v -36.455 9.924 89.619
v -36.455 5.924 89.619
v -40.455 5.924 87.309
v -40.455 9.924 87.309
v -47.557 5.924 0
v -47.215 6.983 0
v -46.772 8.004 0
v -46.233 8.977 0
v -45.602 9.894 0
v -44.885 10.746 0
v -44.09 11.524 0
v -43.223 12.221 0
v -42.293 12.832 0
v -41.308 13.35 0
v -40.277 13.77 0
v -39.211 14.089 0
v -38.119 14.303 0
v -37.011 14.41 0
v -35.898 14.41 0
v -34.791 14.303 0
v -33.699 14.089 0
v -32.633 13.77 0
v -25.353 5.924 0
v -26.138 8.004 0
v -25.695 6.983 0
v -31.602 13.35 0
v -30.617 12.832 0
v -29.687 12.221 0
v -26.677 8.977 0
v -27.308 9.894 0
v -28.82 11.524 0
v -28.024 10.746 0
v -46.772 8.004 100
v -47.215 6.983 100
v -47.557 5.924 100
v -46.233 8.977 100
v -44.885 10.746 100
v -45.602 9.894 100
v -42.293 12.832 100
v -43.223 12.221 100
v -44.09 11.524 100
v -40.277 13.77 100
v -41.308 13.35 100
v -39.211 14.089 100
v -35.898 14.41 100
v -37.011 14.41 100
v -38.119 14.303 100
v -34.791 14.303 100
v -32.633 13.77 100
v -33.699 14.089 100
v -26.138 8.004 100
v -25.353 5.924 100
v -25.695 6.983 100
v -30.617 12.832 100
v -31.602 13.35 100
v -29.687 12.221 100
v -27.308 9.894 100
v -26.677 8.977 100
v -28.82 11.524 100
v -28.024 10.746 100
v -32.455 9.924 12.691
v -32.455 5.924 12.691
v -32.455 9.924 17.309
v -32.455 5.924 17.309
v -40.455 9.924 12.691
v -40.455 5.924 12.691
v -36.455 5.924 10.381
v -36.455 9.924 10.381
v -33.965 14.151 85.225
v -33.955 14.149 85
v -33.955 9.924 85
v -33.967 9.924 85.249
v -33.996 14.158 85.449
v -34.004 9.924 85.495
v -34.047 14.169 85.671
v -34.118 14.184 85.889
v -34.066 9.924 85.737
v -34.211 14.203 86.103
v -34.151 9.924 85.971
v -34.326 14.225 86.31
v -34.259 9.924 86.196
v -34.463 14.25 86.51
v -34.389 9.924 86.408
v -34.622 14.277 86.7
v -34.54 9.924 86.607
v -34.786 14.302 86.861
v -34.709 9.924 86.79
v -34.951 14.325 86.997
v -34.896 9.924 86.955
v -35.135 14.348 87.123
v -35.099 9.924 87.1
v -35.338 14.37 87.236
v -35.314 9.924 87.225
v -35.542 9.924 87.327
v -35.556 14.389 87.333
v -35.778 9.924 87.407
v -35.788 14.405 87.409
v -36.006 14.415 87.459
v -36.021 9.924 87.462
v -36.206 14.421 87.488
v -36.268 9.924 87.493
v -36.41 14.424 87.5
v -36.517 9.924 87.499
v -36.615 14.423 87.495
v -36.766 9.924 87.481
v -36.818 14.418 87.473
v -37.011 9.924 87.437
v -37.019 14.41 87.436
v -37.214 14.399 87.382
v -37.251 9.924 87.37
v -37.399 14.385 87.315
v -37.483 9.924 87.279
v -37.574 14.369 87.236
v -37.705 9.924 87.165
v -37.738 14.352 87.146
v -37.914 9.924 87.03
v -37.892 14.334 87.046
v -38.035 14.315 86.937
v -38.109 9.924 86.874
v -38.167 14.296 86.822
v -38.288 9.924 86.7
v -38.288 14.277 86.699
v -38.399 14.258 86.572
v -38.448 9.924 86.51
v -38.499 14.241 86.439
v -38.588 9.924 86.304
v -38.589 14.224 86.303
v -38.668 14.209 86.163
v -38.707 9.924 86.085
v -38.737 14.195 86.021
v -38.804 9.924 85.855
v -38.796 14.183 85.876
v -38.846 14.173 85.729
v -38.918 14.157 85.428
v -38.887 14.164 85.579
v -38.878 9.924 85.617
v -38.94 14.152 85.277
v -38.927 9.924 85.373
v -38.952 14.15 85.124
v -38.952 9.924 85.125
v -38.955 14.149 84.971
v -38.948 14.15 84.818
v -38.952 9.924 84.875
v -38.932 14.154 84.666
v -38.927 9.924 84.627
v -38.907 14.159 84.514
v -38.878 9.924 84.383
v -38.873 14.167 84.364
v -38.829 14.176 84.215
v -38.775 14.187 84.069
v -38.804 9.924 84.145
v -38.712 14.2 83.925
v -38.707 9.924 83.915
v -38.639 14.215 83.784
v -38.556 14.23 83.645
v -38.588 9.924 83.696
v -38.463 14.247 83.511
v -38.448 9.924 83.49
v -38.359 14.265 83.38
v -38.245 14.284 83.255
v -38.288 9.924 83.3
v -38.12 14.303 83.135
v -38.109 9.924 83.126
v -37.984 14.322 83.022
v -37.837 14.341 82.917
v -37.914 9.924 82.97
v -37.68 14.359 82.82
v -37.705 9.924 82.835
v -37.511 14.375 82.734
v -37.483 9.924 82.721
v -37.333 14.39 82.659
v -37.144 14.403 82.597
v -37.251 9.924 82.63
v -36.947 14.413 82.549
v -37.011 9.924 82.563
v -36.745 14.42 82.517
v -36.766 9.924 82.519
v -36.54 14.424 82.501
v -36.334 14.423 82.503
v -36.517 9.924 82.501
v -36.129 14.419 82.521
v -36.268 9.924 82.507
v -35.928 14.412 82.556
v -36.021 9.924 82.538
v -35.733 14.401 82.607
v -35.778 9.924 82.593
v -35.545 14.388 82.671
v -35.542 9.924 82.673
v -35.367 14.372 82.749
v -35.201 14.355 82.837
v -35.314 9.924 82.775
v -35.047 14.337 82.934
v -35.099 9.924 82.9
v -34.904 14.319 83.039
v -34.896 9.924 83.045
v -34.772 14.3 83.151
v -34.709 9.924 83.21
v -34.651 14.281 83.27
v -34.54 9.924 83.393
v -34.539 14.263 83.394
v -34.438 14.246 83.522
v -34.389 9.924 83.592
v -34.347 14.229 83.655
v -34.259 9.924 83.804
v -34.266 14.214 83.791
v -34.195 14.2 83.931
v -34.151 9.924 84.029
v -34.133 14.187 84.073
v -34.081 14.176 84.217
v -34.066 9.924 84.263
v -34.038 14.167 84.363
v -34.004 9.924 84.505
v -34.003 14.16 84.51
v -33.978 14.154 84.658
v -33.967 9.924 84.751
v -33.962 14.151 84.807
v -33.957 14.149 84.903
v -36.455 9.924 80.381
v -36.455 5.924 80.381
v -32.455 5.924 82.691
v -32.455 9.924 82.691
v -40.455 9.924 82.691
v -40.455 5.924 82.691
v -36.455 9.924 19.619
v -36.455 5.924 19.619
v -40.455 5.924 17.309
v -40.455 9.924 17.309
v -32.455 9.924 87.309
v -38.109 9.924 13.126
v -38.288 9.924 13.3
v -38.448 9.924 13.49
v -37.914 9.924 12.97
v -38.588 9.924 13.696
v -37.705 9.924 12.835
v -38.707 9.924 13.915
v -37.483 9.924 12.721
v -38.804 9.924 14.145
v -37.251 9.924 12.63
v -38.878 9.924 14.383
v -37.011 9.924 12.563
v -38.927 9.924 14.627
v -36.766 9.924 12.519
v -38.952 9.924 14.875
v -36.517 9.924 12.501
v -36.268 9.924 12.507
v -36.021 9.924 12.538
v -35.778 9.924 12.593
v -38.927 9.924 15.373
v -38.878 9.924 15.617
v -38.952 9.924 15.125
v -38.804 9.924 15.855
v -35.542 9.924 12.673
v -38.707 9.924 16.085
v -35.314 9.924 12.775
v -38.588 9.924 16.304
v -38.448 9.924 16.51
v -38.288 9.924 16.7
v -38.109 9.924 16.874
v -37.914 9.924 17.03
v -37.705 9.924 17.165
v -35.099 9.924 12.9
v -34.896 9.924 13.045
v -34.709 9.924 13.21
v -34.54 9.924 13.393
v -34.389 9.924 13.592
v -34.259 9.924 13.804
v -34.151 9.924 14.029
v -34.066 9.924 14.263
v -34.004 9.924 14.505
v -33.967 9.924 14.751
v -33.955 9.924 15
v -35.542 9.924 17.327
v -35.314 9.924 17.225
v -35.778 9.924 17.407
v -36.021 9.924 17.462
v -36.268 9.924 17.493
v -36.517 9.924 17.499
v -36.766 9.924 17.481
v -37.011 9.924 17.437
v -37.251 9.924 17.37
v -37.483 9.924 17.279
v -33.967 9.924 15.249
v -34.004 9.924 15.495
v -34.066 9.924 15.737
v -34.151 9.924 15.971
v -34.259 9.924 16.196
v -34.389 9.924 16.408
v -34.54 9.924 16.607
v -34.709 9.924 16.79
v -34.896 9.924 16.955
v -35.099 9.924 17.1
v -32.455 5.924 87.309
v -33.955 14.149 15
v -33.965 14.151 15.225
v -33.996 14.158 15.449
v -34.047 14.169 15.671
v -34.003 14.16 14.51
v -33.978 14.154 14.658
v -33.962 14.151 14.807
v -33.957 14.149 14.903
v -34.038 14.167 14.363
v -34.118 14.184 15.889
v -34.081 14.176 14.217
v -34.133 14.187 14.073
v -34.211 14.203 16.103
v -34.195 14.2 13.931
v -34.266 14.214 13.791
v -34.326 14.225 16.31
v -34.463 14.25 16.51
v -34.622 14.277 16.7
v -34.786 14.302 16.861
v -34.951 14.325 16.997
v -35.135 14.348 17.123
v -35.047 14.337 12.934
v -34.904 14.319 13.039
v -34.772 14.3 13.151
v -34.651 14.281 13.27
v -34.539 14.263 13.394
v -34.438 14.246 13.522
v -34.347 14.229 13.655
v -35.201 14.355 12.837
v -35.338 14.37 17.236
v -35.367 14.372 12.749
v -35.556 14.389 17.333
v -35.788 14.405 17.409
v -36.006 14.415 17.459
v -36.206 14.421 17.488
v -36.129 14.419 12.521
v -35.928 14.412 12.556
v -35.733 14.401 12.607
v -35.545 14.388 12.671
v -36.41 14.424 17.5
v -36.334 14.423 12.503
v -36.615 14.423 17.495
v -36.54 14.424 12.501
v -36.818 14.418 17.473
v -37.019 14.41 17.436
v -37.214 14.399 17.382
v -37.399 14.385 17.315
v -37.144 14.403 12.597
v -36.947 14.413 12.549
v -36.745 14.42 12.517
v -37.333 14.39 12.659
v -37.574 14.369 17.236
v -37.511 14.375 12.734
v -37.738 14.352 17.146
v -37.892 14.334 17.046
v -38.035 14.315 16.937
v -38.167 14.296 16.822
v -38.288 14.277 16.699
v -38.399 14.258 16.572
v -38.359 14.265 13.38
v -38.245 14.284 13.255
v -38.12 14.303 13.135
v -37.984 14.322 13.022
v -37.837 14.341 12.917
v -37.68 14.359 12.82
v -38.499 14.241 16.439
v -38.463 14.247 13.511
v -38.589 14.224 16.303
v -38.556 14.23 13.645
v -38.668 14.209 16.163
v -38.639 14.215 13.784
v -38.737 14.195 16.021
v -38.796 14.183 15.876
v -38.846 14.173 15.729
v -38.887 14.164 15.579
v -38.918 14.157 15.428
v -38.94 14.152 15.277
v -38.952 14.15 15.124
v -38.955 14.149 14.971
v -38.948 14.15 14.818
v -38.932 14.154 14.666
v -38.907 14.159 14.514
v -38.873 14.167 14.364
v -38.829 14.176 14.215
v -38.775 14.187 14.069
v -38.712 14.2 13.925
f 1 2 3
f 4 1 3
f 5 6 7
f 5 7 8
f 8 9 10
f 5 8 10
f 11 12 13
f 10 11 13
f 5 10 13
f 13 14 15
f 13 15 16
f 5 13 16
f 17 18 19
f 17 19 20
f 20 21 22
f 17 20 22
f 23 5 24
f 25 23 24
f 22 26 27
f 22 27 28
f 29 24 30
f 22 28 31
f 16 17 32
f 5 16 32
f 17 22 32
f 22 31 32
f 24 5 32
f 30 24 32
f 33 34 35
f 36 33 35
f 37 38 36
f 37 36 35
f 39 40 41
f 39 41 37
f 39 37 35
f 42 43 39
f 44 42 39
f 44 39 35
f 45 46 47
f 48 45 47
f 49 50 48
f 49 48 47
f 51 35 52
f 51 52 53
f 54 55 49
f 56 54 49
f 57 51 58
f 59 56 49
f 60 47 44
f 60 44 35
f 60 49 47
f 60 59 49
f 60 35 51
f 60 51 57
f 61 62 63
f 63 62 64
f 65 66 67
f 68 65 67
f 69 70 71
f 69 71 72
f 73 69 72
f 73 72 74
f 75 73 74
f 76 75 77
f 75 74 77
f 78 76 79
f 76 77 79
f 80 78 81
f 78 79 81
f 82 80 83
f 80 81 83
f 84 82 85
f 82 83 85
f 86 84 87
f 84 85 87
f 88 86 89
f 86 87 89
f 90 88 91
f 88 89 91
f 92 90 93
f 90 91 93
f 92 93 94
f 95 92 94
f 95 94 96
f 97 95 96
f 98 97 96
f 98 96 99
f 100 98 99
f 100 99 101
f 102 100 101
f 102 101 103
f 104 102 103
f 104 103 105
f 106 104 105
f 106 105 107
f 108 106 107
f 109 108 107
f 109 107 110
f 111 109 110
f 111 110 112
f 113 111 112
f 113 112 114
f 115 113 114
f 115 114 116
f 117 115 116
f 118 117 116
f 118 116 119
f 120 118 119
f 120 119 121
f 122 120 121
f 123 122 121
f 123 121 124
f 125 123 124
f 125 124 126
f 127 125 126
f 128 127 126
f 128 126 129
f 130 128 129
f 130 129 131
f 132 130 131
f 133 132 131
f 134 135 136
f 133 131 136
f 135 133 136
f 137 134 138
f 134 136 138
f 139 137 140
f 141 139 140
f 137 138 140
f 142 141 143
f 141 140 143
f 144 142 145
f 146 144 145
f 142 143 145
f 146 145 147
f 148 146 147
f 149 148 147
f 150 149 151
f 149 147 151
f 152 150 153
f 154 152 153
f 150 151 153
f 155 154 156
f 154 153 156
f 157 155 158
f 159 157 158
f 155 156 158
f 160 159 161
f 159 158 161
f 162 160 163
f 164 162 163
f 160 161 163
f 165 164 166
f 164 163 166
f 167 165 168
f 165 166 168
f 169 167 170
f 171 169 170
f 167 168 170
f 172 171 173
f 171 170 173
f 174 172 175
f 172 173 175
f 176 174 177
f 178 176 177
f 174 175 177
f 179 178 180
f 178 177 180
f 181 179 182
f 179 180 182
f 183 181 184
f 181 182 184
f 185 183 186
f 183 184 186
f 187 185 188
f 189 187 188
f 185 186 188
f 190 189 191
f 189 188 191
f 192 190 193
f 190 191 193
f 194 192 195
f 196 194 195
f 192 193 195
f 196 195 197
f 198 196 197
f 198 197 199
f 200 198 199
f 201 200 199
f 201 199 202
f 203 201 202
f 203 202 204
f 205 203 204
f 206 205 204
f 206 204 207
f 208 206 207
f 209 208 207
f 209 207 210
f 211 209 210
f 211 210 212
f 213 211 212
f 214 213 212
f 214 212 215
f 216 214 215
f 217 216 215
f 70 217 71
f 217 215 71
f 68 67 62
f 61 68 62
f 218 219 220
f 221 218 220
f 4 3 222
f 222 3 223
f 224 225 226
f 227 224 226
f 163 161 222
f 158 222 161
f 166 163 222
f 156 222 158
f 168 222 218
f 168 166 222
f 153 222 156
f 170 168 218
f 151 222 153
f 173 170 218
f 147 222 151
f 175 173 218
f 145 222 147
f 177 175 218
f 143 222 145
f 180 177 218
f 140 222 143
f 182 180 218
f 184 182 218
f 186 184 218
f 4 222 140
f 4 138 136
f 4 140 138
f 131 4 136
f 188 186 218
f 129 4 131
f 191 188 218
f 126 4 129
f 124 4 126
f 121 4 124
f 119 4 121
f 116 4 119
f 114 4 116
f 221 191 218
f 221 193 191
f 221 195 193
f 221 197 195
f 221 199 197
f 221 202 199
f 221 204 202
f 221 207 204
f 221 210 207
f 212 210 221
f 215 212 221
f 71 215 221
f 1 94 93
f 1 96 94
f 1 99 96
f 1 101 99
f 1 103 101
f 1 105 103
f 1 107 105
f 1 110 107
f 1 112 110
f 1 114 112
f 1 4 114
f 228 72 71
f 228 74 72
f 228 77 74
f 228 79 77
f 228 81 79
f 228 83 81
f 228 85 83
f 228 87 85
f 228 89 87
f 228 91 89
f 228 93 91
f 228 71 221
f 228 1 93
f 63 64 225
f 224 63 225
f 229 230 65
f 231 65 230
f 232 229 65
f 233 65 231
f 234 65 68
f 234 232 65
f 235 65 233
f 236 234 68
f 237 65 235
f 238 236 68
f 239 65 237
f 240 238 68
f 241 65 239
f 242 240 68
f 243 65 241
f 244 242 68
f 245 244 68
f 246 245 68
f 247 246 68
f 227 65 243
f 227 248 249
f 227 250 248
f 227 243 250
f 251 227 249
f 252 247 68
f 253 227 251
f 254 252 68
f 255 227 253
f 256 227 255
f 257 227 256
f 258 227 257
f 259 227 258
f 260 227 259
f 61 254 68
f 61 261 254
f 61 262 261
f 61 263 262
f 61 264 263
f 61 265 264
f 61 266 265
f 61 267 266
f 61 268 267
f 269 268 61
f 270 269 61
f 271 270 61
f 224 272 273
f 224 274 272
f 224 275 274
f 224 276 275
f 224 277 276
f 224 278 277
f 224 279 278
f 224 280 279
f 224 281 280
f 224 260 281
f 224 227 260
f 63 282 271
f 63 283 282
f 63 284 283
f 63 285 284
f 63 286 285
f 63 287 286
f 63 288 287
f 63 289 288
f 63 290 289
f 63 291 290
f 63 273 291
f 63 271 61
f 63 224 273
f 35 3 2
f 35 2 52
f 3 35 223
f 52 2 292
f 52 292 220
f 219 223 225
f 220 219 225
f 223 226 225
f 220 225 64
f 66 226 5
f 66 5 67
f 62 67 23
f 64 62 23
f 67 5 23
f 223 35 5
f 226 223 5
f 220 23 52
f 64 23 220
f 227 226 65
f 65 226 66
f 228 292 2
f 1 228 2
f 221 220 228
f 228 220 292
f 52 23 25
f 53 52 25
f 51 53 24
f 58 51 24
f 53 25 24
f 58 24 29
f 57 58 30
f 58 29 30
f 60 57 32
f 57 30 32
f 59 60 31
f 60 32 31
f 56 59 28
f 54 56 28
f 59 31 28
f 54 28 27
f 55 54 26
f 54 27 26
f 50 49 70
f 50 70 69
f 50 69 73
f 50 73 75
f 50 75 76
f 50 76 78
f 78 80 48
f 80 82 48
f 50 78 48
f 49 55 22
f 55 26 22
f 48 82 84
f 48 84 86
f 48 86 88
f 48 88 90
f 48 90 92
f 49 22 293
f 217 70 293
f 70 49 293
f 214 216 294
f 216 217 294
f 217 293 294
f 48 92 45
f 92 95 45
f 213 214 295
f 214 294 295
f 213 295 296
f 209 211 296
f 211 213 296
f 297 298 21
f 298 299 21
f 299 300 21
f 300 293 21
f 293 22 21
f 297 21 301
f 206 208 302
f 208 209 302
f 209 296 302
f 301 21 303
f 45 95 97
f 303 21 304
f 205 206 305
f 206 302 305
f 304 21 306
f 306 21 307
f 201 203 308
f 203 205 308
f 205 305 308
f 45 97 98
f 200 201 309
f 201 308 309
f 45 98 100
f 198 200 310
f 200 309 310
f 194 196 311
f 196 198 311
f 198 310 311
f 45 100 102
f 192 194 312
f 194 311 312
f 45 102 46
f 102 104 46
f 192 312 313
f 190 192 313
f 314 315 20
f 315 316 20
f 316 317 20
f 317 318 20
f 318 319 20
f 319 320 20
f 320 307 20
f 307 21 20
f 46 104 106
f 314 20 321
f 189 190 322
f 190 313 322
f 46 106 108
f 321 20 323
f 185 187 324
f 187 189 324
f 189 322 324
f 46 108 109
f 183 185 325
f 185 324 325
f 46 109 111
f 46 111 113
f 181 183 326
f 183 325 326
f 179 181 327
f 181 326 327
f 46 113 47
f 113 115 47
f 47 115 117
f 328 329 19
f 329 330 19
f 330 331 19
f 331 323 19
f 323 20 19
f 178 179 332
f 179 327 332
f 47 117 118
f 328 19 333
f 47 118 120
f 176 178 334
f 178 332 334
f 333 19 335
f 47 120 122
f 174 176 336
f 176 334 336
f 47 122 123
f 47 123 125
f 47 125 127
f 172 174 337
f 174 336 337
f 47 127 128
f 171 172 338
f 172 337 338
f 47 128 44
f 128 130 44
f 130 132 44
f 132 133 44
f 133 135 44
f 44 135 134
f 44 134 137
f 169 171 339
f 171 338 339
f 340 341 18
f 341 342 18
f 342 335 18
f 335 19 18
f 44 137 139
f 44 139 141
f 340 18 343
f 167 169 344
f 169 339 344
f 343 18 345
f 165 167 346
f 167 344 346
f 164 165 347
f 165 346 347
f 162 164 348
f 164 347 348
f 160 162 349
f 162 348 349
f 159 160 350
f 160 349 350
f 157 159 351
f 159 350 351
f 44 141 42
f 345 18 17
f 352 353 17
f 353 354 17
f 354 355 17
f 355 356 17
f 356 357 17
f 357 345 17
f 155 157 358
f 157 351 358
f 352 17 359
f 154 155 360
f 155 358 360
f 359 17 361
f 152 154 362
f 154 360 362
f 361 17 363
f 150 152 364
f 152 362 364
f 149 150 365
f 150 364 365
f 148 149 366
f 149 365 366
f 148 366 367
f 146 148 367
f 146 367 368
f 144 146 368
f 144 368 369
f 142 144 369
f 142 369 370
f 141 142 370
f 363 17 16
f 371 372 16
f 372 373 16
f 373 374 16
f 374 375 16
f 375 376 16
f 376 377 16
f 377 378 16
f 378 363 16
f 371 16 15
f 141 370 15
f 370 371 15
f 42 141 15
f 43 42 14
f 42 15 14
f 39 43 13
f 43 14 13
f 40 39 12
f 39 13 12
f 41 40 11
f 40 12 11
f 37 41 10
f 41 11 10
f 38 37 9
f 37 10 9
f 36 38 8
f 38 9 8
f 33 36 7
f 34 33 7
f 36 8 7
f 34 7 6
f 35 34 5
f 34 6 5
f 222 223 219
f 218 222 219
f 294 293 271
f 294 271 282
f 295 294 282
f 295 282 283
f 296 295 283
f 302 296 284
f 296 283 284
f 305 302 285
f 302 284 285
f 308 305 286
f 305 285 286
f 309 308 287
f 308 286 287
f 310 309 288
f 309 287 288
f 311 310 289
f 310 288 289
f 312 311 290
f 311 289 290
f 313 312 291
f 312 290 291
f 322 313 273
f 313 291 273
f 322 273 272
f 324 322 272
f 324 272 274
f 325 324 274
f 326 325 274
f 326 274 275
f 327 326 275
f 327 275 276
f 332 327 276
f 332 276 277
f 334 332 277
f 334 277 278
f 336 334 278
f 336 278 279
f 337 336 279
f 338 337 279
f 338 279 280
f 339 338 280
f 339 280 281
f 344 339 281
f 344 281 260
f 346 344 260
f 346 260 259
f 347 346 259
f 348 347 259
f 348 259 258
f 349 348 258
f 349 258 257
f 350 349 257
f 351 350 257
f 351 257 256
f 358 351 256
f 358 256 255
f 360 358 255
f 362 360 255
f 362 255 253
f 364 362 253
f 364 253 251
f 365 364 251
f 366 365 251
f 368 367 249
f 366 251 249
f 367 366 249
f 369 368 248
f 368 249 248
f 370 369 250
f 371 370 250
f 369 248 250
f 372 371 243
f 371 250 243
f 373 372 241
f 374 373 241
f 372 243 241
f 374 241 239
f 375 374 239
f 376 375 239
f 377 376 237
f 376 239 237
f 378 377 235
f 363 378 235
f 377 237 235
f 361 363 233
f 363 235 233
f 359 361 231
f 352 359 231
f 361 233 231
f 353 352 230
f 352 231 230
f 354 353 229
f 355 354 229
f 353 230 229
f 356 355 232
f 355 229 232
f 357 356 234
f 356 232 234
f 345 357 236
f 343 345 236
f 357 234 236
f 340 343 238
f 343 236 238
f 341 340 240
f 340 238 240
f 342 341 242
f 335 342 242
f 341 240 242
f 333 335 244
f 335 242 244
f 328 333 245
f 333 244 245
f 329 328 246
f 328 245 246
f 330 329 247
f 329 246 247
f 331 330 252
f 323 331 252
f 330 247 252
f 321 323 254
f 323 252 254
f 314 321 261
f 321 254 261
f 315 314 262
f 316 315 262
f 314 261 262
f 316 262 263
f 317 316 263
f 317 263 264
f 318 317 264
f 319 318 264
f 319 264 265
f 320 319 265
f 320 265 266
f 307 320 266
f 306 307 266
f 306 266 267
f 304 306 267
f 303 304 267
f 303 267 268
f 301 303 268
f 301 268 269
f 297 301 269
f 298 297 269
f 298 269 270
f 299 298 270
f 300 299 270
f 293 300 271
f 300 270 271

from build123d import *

# Parameters (mm, degrees)
SALIENTE_EXTRUIR1_DEPTH = 100
CORTAR_EXTRUIR1_DEPTH   = 4
CROQUIS3_R              = 2.5
CORTAR_EXTRUIR2_DEPTH   = 14


with BuildPart() as part:
    # Croquis1 → Saliente-Extruir1 (new body)
    with BuildSketch(Plane.XY):
        with BuildLine():
            Line((-47.556708367, 5.923922341), (-25.353105055, 5.923922341))
            ThreePointArc((-25.353105055, 5.923922341), (-36.454906711, 14.423922341), (-47.556708367, 5.923922341))
        make_face()
    extrude(amount=SALIENTE_EXTRUIR1_DEPTH)

    # Croquis2 → Cortar-Extruir1 (cut)
    with BuildSketch(Plane.XZ.offset(-5.923922341)):
        Polygon((-36.454906711, 80.381197846), (-32.454906711, 82.690598923), (-32.454906711, 87.309401077), (-36.454906711, 89.618802154), (-40.454906711, 87.309401077), (-40.454906711, 82.690598923), align=None)
        Polygon((-36.454906711, 10.381197846), (-32.454906711, 12.690598923), (-32.454906711, 17.309401077), (-36.454906711, 19.618802154), (-40.454906711, 17.309401077), (-40.454906711, 12.690598923), align=None)
    extrude(amount=-CORTAR_EXTRUIR1_DEPTH, mode=Mode.SUBTRACT)

    # Croquis3 → Cortar-Extruir2 (cut)
    with BuildSketch(Plane.XZ.offset(-9.923922341)):
        with Locations((-36.454906711, 15)):
            Circle(CROQUIS3_R)
        with Locations((-36.454906711, 85)):
            Circle(CROQUIS3_R)
    extrude(amount=-CORTAR_EXTRUIR2_DEPTH, mode=Mode.SUBTRACT)


solid = part.part
